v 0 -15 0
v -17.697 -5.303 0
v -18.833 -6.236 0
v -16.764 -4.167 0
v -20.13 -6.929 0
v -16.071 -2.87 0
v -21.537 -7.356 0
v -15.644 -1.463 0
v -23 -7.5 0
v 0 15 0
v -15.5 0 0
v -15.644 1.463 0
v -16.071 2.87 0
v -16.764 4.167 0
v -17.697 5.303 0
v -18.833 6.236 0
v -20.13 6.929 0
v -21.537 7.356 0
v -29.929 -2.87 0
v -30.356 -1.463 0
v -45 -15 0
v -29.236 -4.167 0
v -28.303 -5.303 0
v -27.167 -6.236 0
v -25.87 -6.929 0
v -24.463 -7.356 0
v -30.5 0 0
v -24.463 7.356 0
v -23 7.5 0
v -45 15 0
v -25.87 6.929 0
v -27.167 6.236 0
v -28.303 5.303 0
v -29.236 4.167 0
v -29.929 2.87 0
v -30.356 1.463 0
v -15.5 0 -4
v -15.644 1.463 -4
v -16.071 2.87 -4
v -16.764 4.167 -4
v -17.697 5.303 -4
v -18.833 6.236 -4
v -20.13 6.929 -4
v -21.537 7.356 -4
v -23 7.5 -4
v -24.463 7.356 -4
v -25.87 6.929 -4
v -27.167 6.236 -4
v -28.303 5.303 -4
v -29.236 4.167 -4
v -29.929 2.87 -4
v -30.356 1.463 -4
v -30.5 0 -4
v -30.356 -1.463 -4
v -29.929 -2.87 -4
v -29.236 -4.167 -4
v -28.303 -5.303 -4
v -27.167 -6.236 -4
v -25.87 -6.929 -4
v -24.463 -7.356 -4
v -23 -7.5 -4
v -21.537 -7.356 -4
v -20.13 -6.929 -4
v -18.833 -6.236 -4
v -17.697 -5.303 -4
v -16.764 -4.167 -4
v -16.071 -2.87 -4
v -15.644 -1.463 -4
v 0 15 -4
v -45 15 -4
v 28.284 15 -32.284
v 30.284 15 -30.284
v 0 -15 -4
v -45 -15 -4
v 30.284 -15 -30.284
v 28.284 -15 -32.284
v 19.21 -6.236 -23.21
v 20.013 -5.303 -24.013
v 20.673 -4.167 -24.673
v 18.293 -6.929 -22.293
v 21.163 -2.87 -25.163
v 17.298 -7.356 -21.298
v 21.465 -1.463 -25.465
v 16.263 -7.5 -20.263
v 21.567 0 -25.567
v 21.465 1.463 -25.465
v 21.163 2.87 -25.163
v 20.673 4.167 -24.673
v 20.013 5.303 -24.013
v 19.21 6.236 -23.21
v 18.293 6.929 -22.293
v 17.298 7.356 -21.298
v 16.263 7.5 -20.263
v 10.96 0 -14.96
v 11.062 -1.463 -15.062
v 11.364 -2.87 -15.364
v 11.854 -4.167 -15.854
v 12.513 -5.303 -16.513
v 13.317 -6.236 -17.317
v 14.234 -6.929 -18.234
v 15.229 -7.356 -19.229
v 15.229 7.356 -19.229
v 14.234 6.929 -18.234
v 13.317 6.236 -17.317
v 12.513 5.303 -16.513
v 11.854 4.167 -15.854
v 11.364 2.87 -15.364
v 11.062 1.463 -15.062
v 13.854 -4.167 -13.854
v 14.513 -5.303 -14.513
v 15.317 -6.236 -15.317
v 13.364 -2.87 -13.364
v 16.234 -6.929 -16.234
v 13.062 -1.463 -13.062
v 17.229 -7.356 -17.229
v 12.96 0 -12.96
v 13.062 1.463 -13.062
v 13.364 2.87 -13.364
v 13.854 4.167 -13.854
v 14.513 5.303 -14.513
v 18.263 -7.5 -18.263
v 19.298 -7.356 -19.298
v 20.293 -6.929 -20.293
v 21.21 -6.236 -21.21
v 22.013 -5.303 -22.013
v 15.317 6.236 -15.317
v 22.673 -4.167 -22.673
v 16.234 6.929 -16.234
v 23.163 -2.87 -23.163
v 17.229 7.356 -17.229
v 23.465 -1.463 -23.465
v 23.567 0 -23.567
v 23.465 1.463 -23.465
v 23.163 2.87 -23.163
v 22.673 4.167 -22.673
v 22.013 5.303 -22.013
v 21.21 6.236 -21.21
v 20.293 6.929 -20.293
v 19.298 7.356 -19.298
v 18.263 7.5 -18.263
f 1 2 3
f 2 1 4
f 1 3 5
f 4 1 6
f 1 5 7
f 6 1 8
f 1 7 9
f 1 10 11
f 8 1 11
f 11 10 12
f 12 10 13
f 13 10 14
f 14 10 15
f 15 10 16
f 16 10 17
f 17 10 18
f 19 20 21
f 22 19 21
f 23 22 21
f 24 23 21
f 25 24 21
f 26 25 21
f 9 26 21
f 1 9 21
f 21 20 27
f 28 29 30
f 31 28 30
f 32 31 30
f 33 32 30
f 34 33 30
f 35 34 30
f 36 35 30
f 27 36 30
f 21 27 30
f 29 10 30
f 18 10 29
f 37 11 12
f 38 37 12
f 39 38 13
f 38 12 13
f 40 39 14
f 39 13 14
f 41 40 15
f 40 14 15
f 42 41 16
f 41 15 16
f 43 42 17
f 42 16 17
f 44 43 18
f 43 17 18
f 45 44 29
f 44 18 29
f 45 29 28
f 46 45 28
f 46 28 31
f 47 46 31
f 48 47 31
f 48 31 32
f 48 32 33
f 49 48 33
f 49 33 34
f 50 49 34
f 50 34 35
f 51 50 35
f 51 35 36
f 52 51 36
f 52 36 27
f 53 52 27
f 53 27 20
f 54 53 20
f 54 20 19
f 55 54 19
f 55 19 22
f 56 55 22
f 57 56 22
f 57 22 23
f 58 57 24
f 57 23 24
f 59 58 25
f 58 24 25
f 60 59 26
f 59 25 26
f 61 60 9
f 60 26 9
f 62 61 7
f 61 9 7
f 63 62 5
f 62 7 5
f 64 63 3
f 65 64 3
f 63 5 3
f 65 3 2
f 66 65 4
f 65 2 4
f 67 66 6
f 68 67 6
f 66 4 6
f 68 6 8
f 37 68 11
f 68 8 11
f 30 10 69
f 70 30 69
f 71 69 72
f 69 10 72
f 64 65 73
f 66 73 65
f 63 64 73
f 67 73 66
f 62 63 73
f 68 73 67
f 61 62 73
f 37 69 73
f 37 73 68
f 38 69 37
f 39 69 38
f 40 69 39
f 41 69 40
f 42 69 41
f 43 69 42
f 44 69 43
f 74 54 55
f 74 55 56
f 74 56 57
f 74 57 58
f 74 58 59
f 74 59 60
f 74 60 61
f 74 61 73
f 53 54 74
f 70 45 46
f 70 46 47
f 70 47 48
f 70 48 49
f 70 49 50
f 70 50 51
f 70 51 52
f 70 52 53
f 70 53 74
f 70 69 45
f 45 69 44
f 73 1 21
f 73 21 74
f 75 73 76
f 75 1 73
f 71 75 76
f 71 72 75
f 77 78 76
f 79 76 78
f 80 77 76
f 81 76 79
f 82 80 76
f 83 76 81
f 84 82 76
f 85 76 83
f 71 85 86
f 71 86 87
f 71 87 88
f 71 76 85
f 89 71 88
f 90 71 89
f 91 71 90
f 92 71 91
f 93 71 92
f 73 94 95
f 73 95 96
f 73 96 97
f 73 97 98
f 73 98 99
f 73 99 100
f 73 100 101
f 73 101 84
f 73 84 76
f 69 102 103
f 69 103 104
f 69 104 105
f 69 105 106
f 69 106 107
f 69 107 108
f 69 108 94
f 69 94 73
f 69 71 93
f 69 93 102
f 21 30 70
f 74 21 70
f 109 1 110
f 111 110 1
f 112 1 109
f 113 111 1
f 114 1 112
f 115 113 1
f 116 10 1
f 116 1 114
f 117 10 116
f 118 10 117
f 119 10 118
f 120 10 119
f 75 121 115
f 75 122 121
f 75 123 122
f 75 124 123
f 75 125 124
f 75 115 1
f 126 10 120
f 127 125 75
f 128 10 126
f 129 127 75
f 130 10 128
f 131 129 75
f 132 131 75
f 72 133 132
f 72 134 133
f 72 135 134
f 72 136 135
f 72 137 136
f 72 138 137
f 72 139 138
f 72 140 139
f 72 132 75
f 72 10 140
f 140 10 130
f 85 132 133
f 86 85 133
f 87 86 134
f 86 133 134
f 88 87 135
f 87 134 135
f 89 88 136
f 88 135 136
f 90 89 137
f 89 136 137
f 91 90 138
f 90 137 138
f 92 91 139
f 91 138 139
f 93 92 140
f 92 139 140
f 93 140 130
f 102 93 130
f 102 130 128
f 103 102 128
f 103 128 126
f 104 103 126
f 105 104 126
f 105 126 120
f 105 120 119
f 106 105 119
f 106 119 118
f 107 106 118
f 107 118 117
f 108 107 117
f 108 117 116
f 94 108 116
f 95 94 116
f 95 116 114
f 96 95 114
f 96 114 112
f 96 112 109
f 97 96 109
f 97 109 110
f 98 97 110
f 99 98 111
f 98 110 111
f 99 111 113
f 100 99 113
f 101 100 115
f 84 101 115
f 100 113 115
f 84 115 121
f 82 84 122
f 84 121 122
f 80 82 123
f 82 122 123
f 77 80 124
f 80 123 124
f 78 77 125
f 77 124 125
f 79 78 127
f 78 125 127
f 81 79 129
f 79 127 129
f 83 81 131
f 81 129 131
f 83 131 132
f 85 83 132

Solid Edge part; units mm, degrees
sketch "Sketch1" plane through (0, 0, 0) normal (0, -1, 0) x (1, 0, 0)
  line L0 (0, 0) -> (-45, 0)
  line L1 (-45, 0) -> (-45, -4)
  line L2 (0, -4) -> (-45, -4)
  line L3 (28.2843, -32.2843) -> (0, -4)
  line L4 (30.2843, -30.2843) -> (28.2843, -32.2843)
  line L5 (0, 0) -> (30.2843, -30.2843)
  dimension "D1" = 4
  dimension "D2" = 45
  dimension "D3" = 40
extrude "Protrusion1" add sketch "Sketch1" along normal mid plane 30
sketch "Sketch2" plane through (-15, 0, 0) normal (0, 0, 1) x (1, 0, 0)
  circle A0 centre (-8, 0) radius 7.5
  dimension "D1" = 15
  dimension "D2" = 23
extrude "Cutout1" cut sketch "Sketch2" against normal up to surface (4 mm away)
sketch "Sketch3" plane through (10.6066, 0, -10.6066) normal (0.7071068, 0, 0.7071068) x (0.7071068, 0, -0.7071068)
  circle A0 centre (10.8284, 0) radius 7.5
  dimension "D1" = 15
  dimension "D2" = 23
extrude "Cutout2" cut sketch "Sketch3" against normal up to surface (2.8284 mm away)
properties material "Stainless steel"
